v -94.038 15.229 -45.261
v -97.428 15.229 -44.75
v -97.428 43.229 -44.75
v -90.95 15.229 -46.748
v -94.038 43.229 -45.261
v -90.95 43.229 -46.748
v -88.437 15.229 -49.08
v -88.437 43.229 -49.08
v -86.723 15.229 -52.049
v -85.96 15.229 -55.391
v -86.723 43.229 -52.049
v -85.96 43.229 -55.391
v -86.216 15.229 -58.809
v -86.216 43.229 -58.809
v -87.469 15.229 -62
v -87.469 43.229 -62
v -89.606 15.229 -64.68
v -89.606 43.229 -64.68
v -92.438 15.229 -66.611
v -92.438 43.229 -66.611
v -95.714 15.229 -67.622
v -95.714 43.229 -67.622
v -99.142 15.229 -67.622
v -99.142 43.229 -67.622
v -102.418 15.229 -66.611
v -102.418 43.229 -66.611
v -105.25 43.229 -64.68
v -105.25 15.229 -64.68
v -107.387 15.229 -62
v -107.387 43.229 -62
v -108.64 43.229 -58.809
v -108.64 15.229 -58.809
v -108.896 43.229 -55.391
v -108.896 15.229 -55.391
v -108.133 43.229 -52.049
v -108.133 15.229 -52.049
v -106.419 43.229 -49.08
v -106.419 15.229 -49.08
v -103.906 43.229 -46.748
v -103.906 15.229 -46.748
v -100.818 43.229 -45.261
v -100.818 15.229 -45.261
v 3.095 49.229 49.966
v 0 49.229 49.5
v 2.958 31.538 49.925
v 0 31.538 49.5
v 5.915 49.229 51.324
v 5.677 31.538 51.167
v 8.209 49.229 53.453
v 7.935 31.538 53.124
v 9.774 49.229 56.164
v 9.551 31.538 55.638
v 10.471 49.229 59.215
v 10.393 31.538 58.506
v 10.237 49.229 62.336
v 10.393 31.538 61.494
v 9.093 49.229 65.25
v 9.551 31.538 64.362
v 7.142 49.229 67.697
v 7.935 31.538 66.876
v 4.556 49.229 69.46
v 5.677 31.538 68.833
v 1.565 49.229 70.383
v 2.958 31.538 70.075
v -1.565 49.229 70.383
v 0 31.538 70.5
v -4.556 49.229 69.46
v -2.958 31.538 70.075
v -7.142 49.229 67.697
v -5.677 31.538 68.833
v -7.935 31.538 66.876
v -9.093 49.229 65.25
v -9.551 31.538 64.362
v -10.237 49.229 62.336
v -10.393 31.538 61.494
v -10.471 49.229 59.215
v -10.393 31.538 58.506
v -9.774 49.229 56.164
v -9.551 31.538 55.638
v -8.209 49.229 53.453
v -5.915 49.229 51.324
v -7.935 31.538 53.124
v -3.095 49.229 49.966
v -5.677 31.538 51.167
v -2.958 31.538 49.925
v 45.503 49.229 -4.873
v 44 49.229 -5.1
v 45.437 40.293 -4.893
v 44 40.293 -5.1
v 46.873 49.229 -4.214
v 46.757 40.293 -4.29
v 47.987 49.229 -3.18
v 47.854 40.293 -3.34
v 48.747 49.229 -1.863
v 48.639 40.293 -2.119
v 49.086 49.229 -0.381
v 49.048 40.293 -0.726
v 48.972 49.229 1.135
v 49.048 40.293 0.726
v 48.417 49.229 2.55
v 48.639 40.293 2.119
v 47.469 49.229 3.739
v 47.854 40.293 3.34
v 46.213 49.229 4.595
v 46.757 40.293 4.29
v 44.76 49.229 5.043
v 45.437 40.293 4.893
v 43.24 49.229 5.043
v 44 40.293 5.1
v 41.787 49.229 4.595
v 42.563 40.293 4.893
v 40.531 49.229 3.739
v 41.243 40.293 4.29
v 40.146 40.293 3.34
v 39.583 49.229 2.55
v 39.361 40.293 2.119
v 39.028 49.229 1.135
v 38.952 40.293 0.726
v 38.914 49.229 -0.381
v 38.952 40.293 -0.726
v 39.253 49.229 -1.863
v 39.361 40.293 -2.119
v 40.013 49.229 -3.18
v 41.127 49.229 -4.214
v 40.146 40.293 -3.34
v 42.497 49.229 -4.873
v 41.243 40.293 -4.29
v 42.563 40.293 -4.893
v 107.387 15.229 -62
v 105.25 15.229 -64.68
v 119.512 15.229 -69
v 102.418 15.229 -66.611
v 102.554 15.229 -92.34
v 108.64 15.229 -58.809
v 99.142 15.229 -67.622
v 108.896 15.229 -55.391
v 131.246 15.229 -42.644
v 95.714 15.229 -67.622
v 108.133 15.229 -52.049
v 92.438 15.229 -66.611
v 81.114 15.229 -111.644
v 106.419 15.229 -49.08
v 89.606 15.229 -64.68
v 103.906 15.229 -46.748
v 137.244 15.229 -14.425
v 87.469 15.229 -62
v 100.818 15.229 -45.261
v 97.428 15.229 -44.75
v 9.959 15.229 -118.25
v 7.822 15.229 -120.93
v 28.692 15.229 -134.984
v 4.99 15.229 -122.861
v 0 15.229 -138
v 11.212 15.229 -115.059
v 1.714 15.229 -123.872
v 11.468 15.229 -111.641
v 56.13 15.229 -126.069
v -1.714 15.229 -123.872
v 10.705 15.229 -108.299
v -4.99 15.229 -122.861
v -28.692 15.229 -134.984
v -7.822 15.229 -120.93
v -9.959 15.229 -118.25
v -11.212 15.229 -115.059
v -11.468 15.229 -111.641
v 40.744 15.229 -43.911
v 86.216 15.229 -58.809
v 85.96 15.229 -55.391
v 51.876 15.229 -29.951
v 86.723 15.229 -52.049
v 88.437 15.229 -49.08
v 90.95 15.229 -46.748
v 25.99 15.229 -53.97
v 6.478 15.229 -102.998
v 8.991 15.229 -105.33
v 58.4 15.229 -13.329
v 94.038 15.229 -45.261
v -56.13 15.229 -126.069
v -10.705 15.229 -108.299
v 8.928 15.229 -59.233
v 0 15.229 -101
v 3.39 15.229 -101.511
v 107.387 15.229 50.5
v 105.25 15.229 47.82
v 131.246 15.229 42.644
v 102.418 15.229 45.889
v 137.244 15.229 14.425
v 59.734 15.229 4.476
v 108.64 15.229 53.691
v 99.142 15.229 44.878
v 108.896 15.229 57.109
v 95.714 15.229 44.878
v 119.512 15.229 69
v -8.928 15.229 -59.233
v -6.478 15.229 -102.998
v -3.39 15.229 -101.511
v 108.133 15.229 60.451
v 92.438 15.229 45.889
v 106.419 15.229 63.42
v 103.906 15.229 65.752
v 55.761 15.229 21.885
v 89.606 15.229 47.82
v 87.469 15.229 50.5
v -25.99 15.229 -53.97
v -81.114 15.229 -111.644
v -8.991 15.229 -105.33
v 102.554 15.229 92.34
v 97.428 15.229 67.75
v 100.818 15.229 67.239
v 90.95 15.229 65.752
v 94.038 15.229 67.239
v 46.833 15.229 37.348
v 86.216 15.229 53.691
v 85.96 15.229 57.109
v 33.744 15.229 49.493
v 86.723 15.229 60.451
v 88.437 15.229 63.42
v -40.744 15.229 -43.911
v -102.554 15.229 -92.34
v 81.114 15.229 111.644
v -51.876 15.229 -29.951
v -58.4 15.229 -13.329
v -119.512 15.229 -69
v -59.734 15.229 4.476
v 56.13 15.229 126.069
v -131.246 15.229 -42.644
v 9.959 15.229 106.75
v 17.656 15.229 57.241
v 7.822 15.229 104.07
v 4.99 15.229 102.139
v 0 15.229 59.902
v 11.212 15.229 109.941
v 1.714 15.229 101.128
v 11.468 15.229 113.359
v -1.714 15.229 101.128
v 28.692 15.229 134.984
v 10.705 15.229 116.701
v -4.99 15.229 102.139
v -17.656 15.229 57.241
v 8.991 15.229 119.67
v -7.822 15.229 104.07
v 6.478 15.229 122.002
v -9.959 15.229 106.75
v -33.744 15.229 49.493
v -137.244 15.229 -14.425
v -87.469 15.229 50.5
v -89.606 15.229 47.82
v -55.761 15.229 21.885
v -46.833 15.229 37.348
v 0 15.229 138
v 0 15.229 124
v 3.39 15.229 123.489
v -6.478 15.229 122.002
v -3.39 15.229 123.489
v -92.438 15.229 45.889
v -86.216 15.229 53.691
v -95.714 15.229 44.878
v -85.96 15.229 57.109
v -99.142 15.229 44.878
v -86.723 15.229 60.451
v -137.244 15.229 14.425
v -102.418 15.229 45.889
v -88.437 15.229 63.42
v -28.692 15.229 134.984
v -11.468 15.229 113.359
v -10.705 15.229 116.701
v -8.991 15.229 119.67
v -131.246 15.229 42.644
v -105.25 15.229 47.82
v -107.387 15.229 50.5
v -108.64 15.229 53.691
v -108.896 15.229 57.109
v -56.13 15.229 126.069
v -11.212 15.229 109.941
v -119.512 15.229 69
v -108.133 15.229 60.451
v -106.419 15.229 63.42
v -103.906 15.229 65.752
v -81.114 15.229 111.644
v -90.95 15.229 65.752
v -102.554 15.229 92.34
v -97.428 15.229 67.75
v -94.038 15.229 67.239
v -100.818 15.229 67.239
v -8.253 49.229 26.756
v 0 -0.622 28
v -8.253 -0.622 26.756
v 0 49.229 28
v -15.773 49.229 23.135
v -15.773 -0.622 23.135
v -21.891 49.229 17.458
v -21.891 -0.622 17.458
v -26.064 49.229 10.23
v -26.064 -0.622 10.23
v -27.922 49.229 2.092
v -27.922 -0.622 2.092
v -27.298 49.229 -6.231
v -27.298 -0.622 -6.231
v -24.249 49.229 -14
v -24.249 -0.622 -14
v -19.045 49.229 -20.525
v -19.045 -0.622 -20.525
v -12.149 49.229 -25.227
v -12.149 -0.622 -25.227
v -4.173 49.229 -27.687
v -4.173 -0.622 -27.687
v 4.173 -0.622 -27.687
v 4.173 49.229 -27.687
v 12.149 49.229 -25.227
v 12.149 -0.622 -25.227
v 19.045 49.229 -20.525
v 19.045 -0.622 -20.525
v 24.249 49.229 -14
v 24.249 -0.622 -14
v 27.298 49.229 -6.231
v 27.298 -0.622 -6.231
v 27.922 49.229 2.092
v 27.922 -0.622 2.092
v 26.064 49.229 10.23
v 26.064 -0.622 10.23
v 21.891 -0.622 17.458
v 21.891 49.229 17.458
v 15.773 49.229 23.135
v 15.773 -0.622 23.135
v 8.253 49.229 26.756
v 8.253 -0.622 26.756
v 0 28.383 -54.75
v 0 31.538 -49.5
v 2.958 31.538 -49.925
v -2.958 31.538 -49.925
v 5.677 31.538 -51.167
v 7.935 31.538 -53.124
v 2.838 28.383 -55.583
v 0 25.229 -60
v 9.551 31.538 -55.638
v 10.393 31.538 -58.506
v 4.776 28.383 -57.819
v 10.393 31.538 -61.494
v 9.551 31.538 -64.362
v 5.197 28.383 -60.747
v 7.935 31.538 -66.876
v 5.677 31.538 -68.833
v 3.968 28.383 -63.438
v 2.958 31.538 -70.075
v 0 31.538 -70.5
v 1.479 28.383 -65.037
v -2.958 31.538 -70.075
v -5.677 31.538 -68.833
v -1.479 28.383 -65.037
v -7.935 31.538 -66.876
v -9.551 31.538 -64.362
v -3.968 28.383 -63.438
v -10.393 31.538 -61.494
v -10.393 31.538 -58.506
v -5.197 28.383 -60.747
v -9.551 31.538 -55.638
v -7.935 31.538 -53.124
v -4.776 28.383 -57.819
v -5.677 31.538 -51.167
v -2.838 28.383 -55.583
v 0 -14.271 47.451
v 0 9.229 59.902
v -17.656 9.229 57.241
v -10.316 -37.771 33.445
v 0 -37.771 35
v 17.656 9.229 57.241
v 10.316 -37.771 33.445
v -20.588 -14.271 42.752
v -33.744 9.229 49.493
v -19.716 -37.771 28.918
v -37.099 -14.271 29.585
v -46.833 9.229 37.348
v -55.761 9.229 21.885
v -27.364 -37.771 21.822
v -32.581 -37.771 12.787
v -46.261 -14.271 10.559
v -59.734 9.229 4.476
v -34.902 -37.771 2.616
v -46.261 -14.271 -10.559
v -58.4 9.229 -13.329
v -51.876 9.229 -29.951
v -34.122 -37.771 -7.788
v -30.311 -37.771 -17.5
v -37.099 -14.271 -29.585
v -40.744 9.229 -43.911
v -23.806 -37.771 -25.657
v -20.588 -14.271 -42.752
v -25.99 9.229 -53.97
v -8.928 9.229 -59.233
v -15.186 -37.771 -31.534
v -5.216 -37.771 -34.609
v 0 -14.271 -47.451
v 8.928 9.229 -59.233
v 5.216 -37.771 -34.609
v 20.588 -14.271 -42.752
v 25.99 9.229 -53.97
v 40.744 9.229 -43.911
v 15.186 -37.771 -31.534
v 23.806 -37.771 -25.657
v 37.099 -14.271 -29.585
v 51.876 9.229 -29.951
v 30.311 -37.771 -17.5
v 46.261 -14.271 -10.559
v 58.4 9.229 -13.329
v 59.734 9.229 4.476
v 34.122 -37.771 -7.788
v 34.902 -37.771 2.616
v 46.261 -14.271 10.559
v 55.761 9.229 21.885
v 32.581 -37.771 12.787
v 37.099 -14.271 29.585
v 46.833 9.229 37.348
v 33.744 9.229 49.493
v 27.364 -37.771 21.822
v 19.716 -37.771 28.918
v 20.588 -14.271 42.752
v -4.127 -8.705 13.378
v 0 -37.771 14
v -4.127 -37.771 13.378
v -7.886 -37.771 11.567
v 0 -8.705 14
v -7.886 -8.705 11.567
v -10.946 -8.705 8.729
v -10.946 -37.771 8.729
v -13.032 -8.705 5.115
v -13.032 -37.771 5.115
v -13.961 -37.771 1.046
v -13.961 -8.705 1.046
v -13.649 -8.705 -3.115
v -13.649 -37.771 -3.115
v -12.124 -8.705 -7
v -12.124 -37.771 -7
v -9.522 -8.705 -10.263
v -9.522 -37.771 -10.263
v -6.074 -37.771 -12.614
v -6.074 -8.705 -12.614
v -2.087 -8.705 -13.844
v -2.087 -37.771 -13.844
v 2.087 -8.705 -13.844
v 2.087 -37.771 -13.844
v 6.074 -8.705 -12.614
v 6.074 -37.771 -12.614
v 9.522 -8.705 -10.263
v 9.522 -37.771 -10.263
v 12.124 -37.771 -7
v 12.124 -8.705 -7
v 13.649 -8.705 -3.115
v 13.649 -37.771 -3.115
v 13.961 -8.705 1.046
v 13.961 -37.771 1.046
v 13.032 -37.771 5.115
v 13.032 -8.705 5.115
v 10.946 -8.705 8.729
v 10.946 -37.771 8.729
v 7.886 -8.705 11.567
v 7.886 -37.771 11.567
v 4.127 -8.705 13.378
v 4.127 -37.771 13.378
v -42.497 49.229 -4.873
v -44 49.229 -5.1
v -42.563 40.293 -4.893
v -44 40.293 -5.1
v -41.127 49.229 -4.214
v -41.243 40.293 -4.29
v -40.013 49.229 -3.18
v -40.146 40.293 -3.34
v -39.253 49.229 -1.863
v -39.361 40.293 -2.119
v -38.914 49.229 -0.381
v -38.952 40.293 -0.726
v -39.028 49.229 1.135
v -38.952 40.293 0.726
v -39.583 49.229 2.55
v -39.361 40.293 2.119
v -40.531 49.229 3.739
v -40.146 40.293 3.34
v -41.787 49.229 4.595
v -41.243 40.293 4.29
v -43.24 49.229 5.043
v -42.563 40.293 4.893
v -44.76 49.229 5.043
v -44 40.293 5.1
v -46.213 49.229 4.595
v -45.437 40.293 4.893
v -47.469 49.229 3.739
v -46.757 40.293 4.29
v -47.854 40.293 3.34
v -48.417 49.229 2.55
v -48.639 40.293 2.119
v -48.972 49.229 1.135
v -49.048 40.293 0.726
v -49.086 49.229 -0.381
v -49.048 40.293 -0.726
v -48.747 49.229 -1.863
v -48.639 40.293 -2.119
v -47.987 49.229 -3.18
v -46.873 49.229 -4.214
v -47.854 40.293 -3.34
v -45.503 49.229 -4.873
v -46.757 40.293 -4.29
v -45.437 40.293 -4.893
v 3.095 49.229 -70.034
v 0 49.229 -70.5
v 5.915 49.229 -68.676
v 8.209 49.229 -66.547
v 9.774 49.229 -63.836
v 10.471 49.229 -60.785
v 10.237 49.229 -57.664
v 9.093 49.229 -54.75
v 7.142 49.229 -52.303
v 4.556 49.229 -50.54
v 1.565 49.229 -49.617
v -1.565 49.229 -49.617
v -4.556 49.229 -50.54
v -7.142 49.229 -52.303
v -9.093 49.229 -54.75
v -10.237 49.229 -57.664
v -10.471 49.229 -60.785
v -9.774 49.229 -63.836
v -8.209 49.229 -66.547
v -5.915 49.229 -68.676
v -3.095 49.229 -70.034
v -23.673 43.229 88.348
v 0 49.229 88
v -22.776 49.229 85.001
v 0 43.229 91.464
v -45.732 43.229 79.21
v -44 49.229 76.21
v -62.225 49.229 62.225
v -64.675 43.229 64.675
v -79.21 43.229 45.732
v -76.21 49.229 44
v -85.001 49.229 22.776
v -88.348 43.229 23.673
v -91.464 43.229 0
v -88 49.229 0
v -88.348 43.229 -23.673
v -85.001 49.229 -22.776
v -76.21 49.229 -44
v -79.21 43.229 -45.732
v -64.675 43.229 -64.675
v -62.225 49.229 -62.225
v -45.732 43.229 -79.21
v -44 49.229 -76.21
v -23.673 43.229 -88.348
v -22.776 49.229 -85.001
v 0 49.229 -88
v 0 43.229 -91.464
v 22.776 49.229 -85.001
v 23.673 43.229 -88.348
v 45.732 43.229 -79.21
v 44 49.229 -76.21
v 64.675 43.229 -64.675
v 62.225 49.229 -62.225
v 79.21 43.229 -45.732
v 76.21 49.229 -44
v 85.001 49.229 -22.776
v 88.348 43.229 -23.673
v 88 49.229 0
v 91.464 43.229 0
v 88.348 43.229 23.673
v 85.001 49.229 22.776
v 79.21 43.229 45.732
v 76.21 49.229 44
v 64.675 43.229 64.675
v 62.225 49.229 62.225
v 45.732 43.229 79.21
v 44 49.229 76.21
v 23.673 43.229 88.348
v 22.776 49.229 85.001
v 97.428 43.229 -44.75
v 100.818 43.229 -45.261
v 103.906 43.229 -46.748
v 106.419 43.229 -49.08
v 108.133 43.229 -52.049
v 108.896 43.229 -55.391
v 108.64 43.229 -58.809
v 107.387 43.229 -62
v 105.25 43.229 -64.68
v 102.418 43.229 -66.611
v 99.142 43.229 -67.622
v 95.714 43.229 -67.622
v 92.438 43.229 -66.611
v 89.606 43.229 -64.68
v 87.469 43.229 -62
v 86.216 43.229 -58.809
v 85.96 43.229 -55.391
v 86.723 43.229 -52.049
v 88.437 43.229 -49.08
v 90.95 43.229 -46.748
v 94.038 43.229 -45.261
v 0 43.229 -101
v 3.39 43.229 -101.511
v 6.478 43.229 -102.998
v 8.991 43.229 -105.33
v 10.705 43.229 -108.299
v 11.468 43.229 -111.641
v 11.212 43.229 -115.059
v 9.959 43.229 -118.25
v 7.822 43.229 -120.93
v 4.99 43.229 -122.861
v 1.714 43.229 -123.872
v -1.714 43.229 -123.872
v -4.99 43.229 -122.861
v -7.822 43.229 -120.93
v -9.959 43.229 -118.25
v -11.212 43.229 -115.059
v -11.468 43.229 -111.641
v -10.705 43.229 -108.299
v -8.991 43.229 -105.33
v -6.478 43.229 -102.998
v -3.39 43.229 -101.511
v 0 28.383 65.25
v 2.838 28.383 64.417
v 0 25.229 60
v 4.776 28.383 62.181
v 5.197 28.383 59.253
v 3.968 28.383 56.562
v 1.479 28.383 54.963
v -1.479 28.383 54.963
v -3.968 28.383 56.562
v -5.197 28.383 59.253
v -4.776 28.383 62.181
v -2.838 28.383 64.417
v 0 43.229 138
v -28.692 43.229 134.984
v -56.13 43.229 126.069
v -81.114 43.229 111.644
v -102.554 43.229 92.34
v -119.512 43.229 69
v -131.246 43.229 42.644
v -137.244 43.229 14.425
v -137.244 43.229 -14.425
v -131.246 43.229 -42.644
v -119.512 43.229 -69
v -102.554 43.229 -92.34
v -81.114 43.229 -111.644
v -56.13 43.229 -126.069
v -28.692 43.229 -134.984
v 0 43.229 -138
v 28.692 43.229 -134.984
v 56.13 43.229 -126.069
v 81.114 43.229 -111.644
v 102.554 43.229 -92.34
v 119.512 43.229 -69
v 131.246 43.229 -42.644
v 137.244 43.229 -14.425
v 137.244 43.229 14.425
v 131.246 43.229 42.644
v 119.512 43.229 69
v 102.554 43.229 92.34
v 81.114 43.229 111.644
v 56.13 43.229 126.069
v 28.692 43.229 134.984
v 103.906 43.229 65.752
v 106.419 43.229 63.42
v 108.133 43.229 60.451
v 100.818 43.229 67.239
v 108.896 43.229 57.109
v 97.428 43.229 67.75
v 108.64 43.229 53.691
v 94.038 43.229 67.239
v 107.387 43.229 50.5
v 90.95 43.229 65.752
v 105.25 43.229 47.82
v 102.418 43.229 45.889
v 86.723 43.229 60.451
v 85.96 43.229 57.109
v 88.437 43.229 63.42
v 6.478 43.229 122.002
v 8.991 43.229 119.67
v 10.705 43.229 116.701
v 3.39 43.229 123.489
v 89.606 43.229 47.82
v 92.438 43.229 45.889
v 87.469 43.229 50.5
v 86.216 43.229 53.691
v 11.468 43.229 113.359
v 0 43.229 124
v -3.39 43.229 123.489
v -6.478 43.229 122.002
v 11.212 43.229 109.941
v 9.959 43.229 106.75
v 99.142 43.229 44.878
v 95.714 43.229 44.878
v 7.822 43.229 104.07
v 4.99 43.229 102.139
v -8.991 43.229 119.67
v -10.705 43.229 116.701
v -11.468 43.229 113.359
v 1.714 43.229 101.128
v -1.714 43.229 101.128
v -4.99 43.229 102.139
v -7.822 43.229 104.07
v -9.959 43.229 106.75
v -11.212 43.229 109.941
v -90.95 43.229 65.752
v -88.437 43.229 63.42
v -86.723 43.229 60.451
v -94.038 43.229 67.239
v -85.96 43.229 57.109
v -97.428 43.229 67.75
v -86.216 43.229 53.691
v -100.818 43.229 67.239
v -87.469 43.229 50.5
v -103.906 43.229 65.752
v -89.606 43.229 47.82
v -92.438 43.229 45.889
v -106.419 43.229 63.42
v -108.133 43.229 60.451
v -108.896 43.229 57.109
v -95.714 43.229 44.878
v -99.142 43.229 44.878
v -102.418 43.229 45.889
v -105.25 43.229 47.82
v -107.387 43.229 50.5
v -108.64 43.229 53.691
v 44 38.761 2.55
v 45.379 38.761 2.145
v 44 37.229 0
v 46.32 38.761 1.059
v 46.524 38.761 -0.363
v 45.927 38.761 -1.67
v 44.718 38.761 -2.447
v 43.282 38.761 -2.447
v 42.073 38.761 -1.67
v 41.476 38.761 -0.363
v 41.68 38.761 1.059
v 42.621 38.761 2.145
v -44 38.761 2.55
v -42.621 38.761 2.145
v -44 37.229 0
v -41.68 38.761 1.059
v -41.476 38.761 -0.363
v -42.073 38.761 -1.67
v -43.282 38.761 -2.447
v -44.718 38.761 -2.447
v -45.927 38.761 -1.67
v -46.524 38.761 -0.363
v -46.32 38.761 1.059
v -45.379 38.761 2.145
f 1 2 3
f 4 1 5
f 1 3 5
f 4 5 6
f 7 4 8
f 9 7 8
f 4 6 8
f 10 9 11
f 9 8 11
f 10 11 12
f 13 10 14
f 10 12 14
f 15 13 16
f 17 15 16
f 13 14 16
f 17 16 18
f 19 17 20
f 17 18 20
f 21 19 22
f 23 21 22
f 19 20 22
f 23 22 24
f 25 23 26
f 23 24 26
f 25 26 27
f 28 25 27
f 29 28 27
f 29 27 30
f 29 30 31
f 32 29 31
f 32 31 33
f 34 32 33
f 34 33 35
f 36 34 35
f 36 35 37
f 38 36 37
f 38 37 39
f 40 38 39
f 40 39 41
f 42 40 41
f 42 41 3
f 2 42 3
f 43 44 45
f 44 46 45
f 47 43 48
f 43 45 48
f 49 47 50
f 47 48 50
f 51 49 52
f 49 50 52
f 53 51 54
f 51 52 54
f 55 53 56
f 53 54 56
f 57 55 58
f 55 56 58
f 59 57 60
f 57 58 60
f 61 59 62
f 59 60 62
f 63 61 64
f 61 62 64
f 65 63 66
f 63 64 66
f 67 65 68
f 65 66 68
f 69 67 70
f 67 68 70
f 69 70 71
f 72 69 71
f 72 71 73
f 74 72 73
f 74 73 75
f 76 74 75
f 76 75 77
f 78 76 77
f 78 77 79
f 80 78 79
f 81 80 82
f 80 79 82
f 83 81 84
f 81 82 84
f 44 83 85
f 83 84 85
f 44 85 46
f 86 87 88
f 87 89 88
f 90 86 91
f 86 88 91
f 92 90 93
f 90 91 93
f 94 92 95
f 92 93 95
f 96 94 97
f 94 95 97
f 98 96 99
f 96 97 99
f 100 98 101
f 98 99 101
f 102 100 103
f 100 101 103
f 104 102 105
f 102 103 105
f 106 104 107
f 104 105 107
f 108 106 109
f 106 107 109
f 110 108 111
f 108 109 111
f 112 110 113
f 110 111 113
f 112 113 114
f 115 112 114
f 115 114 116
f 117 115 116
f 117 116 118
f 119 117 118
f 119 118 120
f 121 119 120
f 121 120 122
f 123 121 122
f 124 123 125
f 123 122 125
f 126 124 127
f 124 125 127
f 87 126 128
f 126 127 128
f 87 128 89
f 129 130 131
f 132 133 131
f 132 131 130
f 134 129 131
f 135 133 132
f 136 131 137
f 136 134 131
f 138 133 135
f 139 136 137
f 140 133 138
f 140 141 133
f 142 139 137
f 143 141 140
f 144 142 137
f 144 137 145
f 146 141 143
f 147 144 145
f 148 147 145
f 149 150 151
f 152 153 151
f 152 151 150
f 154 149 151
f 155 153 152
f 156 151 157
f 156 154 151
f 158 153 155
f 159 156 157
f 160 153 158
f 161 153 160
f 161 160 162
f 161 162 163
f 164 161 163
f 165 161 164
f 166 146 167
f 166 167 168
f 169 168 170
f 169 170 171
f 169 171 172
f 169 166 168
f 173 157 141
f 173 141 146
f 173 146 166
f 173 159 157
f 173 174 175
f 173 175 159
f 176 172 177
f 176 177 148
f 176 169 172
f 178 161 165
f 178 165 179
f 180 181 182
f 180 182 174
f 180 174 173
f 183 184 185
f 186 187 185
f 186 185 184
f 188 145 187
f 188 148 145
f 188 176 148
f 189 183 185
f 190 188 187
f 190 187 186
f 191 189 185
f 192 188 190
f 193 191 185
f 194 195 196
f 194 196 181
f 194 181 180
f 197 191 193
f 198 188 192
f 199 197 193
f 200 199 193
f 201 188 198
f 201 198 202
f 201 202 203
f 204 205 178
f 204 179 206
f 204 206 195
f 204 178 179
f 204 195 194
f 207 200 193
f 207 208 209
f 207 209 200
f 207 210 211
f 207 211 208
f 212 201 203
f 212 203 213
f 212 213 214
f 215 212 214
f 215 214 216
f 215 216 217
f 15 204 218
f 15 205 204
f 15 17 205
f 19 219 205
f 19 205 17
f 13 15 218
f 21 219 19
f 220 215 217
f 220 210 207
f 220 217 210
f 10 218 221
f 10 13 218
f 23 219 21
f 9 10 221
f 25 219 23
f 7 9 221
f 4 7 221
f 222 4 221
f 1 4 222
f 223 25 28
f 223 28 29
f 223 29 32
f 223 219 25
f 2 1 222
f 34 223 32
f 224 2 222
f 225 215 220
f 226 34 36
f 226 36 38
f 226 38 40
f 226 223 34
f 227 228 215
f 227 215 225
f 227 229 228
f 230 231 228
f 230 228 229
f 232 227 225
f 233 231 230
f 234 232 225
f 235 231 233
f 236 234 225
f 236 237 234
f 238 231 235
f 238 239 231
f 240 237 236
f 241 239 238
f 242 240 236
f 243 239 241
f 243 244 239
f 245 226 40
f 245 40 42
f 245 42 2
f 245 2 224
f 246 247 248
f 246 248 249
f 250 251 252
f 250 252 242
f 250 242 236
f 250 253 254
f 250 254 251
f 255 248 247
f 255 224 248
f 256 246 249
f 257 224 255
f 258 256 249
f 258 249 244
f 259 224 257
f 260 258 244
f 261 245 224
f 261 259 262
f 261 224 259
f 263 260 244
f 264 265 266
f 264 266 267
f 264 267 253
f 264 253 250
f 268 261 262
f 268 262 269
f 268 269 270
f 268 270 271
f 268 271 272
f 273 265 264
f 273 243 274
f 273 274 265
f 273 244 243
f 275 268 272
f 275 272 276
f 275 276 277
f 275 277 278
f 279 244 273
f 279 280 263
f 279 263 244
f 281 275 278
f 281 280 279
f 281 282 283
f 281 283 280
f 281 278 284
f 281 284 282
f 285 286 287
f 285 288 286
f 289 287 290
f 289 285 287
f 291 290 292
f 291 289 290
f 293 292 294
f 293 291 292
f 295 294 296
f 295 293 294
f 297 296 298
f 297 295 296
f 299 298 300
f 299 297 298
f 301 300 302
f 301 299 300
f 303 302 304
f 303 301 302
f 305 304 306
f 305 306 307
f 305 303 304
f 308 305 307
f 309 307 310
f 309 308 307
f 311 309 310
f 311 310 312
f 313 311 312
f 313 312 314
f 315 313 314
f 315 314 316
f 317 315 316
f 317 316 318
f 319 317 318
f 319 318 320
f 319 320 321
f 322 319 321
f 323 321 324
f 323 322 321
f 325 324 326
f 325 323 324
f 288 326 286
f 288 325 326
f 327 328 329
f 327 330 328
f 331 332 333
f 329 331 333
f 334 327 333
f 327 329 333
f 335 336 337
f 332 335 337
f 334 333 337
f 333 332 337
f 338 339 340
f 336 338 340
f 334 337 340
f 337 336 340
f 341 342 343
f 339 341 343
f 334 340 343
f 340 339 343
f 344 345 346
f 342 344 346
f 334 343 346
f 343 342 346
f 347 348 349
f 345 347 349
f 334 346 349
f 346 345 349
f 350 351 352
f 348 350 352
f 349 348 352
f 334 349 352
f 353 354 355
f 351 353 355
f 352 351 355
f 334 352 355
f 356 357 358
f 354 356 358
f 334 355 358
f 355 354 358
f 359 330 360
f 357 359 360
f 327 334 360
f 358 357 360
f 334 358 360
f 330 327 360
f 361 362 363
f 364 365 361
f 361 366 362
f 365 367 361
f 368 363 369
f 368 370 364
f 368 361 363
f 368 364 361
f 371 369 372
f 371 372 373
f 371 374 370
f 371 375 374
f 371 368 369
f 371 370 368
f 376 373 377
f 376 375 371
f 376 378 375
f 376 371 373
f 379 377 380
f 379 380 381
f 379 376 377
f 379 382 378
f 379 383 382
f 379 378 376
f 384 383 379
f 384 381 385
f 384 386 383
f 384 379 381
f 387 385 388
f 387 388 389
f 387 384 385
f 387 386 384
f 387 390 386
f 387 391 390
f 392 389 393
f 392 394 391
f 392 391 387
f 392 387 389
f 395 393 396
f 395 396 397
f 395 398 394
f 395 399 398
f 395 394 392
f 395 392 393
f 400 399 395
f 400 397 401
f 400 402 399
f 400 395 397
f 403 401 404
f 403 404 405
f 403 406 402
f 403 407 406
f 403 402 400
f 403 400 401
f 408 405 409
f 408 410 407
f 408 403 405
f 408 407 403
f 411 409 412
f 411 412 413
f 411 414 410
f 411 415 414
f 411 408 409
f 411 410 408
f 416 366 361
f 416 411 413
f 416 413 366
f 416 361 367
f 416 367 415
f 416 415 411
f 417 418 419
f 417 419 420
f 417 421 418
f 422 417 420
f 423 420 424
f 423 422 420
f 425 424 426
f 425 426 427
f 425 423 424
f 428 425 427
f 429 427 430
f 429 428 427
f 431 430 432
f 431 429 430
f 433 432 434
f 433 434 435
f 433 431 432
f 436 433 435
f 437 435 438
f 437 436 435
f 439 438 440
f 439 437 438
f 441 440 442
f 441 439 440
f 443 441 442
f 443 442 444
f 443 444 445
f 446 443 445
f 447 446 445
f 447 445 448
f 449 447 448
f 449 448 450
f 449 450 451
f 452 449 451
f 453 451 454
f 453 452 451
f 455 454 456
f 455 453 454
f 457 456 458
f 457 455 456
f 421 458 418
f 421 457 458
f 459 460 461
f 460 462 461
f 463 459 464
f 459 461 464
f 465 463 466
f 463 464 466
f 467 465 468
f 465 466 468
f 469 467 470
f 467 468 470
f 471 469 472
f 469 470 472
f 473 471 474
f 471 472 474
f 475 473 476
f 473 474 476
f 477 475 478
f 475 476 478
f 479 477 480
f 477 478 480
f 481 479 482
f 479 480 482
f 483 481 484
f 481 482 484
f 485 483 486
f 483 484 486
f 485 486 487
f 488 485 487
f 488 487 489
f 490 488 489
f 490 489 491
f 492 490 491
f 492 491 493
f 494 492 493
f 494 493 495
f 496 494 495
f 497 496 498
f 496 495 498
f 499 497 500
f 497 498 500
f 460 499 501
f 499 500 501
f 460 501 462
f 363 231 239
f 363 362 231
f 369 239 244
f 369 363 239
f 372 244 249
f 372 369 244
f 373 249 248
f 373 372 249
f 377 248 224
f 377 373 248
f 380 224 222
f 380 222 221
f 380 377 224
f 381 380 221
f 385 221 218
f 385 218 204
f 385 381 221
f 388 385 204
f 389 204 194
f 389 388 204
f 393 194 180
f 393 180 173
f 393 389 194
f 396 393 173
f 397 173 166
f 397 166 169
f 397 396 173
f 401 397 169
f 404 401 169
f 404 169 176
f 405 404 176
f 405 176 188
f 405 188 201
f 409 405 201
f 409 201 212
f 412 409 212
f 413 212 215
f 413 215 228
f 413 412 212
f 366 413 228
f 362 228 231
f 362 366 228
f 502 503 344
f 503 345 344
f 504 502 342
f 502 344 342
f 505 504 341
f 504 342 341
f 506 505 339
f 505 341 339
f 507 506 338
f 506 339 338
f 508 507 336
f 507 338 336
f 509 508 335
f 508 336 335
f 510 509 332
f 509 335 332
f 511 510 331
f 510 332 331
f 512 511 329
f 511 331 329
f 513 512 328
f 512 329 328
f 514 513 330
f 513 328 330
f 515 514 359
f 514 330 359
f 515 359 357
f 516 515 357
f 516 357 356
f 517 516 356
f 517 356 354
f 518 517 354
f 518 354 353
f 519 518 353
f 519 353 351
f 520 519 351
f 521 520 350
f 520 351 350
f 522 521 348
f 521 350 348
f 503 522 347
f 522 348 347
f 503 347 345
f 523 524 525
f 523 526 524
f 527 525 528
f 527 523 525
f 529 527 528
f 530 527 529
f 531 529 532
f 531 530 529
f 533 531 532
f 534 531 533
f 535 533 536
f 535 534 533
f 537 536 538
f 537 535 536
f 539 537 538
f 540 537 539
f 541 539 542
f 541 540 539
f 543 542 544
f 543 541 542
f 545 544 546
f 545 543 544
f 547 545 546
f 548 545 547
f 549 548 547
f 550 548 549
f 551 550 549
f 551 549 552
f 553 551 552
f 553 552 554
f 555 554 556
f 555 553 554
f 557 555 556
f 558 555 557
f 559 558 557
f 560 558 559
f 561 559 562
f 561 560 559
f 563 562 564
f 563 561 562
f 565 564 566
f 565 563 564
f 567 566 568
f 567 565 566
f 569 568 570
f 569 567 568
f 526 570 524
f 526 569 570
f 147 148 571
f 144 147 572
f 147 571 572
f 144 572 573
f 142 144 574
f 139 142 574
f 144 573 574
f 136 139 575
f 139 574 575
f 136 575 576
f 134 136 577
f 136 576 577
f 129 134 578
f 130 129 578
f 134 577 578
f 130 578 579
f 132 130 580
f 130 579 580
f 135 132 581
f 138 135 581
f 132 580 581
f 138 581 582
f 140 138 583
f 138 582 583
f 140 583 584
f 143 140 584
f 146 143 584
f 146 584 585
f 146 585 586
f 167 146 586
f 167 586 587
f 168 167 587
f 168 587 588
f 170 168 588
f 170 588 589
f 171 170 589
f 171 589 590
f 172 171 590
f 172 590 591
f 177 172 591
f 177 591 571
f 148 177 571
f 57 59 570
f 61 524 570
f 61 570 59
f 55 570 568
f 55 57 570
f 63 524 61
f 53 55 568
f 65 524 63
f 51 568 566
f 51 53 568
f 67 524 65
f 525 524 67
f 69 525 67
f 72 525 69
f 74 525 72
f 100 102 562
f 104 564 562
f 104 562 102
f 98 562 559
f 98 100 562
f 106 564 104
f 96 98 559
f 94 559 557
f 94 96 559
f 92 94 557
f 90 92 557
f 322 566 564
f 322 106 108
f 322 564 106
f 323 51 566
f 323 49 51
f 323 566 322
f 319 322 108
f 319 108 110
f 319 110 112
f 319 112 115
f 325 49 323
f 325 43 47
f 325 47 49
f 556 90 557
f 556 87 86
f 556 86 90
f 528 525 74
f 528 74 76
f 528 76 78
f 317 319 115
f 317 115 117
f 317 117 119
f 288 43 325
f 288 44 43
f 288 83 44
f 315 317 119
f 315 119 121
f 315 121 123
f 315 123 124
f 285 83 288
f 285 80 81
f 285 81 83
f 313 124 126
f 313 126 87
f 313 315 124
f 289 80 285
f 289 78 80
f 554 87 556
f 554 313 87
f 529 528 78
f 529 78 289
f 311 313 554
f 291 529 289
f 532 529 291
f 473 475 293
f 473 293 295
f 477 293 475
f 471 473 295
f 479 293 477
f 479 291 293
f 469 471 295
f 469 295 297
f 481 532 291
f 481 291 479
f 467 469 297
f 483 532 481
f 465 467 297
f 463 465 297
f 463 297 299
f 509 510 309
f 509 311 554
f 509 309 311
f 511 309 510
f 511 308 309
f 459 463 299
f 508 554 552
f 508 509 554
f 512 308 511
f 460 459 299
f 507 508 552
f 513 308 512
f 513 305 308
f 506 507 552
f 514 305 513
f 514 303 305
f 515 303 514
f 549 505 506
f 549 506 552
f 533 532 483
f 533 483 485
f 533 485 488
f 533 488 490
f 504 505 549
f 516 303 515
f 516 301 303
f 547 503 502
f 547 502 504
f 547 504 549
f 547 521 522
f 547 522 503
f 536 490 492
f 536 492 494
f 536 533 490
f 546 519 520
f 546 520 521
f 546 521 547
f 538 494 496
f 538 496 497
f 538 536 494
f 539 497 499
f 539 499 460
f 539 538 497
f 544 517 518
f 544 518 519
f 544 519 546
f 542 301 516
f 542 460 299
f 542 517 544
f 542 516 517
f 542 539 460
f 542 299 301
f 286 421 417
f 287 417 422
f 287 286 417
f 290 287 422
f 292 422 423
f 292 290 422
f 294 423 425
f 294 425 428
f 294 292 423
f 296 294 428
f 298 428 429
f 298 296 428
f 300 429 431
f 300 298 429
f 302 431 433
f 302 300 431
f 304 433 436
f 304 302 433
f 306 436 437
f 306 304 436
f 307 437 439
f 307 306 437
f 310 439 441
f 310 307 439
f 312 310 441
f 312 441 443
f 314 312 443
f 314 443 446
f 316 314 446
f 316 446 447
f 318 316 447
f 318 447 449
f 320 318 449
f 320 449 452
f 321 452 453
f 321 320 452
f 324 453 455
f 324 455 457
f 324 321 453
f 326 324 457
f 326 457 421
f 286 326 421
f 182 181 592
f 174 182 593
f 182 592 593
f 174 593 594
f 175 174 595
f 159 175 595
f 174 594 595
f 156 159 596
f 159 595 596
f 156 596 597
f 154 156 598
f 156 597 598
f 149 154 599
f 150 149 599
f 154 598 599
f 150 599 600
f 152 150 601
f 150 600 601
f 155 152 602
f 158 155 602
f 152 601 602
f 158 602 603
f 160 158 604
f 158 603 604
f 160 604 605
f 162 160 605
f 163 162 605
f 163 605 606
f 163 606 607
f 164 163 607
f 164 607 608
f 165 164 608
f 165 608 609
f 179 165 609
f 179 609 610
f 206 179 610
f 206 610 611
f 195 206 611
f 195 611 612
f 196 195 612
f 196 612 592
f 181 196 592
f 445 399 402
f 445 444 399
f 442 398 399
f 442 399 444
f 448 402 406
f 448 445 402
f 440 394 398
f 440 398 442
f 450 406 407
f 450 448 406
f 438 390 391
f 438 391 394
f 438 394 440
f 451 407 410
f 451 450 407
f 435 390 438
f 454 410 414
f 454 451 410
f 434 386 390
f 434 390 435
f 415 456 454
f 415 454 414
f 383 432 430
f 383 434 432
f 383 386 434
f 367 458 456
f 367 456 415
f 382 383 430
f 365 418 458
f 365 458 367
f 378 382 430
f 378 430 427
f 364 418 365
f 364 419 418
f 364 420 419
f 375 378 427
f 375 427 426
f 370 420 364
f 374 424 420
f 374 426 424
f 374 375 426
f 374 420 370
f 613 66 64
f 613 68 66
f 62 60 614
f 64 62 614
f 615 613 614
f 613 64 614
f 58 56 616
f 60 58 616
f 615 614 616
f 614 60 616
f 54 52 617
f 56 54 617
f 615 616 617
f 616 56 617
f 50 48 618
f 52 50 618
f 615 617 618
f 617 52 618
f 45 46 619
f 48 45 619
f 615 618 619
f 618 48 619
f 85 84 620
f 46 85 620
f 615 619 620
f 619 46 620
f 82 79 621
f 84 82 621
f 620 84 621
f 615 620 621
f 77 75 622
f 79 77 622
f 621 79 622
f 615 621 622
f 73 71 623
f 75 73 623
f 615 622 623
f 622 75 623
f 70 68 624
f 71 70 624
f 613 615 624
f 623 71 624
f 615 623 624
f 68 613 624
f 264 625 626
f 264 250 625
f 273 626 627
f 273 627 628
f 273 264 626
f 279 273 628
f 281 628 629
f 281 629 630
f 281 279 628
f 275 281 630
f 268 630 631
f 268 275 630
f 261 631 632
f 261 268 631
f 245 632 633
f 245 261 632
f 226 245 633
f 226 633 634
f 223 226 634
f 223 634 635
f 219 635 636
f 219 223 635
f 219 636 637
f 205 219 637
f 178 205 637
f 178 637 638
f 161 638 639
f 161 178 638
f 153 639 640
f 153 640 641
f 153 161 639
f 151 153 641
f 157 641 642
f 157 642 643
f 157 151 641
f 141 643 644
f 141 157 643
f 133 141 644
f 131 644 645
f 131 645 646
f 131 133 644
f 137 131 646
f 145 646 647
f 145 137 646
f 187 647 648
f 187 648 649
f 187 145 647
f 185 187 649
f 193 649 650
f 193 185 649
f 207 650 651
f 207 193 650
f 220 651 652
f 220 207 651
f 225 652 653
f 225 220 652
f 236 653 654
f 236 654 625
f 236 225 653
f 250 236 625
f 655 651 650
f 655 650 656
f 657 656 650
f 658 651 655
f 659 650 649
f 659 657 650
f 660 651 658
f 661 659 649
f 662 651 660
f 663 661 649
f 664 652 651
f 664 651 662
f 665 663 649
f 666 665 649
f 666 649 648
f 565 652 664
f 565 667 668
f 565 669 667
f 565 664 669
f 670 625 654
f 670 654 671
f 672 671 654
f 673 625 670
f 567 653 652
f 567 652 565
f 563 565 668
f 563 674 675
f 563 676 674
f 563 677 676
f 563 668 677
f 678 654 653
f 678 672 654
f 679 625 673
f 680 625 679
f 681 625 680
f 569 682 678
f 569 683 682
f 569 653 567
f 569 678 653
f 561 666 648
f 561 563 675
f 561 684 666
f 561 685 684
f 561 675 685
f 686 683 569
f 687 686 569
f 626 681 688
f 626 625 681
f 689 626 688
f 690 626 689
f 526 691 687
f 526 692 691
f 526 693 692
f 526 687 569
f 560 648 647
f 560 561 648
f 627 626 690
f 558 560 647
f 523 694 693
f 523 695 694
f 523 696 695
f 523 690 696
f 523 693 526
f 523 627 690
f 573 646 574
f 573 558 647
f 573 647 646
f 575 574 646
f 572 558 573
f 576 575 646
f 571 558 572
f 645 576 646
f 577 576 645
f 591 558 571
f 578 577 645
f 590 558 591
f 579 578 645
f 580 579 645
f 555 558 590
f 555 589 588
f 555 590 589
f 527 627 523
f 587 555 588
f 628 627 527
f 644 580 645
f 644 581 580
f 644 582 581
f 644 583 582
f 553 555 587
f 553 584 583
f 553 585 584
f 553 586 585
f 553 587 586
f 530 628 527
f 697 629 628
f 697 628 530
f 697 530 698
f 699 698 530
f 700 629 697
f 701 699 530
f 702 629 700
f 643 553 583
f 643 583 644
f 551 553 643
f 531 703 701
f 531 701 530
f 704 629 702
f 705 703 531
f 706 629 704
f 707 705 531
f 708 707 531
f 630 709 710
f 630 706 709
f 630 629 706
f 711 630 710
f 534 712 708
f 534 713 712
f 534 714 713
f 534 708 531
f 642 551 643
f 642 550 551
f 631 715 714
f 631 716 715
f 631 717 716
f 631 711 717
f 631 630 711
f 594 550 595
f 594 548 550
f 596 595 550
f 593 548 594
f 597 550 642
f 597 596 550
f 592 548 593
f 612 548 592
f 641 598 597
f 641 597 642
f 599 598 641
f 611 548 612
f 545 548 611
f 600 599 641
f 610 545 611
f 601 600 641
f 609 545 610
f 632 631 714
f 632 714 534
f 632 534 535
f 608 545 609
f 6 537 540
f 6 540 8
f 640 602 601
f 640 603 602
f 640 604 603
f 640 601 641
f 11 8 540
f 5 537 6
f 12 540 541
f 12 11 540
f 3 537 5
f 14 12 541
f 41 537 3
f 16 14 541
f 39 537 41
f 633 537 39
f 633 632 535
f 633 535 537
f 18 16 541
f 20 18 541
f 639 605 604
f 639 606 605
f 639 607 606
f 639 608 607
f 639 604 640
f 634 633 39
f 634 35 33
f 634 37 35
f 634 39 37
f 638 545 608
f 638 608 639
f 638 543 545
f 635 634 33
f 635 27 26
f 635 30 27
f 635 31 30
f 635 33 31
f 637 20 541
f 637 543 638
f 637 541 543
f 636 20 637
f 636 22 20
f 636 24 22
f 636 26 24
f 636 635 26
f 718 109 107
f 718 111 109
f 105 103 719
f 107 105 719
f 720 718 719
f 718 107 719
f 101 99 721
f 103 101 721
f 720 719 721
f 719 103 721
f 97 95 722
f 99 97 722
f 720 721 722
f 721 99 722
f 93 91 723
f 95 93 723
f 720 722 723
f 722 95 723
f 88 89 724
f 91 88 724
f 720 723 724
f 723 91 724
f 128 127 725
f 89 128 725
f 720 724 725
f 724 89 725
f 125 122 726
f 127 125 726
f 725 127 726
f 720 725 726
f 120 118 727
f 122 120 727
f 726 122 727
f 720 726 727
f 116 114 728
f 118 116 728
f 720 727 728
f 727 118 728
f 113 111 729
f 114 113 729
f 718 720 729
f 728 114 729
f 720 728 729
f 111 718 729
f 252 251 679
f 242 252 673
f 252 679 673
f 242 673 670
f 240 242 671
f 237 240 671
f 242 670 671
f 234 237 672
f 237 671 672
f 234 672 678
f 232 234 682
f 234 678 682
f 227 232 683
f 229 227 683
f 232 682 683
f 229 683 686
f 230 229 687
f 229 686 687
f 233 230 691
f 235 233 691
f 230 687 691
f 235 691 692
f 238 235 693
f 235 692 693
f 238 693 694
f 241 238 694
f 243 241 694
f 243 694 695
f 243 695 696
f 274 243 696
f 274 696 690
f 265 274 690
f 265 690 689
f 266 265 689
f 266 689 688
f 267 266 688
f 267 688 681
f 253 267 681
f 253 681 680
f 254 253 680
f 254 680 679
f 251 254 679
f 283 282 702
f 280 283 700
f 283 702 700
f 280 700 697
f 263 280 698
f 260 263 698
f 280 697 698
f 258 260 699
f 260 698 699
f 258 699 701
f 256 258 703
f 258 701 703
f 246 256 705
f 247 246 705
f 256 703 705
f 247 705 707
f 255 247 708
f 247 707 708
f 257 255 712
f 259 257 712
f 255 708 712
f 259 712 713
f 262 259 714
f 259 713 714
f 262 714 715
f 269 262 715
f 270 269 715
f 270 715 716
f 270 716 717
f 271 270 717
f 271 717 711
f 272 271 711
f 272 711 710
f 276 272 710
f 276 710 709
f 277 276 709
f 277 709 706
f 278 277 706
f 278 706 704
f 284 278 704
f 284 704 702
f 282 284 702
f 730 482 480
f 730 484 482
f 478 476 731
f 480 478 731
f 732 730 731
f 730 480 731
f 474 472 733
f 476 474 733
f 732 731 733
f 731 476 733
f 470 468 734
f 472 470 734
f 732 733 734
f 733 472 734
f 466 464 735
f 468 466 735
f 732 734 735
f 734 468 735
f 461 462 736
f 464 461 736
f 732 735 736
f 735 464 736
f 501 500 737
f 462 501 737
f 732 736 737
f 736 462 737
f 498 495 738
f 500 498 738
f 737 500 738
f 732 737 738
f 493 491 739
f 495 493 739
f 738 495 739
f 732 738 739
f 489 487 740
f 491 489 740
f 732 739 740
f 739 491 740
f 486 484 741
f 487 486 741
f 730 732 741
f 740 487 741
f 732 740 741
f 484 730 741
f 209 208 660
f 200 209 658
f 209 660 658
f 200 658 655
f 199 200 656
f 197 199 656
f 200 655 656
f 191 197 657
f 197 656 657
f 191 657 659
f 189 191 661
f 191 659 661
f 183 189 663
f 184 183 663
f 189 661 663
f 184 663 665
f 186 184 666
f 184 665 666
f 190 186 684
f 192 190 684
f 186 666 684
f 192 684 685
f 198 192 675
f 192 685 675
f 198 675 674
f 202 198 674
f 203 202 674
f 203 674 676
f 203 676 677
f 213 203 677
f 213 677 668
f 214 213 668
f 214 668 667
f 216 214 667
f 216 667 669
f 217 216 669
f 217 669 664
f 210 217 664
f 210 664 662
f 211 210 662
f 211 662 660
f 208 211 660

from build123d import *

# Parameters (mm, degrees)
CUT_EXTRUDE1_REACH     = 213.303
SKETCH2_R              = 11.5
M24_TAPPED_HOLE1_D     = 21
M24_TAPPED_HOLE1_DEPTH = 17.6909635
M24_TAPPED_HOLE1_TIP   = 6.3090365
M12_TAPPED_HOLE1_D     = 10.2
M12_TAPPED_HOLE1_DEPTH = 8.935610843
M12_TAPPED_HOLE1_TIP   = 3.064389157


with BuildPart() as part:
    # Sketch1 → Revolve1 (revolve)
    with BuildSketch(Plane.XY, mode=Mode.PRIVATE) as revolve1_sk:
        Polygon((14, -37.771370899), (14, -8.704913174), (28, -0.622009405), (28, 49.228629101), (88, 49.228629101), (91.464101615, 43.228629101), (138, 43.228629101), (138, 15.228629101), (59.901806028, 15.228629101), (59.901806028, 9.228629101), (35, -37.771370899), align=None)
    revolve(revolve1_sk.sketch.rotate(Axis((0, 62.992349216, 0), (0, -1, 0)), 90), axis=Axis((0, 62.992349216, 0), (0, -1, 0)))

    # Sketch2 → Cut-Extrude1 (cut, up to next)
    with BuildSketch(Plane(origin=(0, 43.228629101, 0), x_dir=(1, 0, 0), z_dir=(0, 1, 0)), mode=Mode.PRIVATE) as cut_extrude1_sk1:
        with Locations(Location((0, 112.5, 0), (0, 0, 270))):
            Circle(SKETCH2_R)
    cut_extrude1_tool1 = extrude(cut_extrude1_sk1.sketch, amount=-CUT_EXTRUDE1_REACH, mode=Mode.PRIVATE) & part.part
    # Sketch2 → Cut-Extrude1 (cut, up to next)
    with BuildSketch(Plane(origin=(0, 43.228629101, 0), x_dir=(1, 0, 0), z_dir=(0, 1, 0)), mode=Mode.PRIVATE) as cut_extrude1_sk2:
        with Locations(Location((97.427857926, 56.25, 0), (0, 0, 270))):
            Circle(SKETCH2_R)
    cut_extrude1_tool2 = extrude(cut_extrude1_sk2.sketch, amount=-CUT_EXTRUDE1_REACH, mode=Mode.PRIVATE) & part.part
    # Sketch2 → Cut-Extrude1 (cut, up to next)
    with BuildSketch(Plane(origin=(0, 43.228629101, 0), x_dir=(1, 0, 0), z_dir=(0, 1, 0)), mode=Mode.PRIVATE) as cut_extrude1_sk3:
        with Locations(Location((97.427857926, -56.25, 0), (0, 0, 270))):
            Circle(SKETCH2_R)
    cut_extrude1_tool3 = extrude(cut_extrude1_sk3.sketch, amount=-CUT_EXTRUDE1_REACH, mode=Mode.PRIVATE) & part.part
    # Sketch2 → Cut-Extrude1 (cut, up to next)
    with BuildSketch(Plane(origin=(0, 43.228629101, 0), x_dir=(1, 0, 0), z_dir=(0, 1, 0)), mode=Mode.PRIVATE) as cut_extrude1_sk4:
        with Locations(Location((0, -112.5, 0), (0, 0, 270))):
            Circle(SKETCH2_R)
    cut_extrude1_tool4 = extrude(cut_extrude1_sk4.sketch, amount=-CUT_EXTRUDE1_REACH, mode=Mode.PRIVATE) & part.part
    # Sketch2 → Cut-Extrude1 (cut, up to next)
    with BuildSketch(Plane(origin=(0, 43.228629101, 0), x_dir=(1, 0, 0), z_dir=(0, 1, 0)), mode=Mode.PRIVATE) as cut_extrude1_sk5:
        with Locations(Location((-97.427857926, -56.25, 0), (0, 0, 270))):
            Circle(SKETCH2_R)
    cut_extrude1_tool5 = extrude(cut_extrude1_sk5.sketch, amount=-CUT_EXTRUDE1_REACH, mode=Mode.PRIVATE) & part.part
    # Sketch2 → Cut-Extrude1 (cut, up to next)
    with BuildSketch(Plane(origin=(0, 43.228629101, 0), x_dir=(1, 0, 0), z_dir=(0, 1, 0)), mode=Mode.PRIVATE) as cut_extrude1_sk6:
        with Locations(Location((-97.427857926, 56.25, 0), (0, 0, 270))):
            Circle(SKETCH2_R)
    cut_extrude1_tool6 = extrude(cut_extrude1_sk6.sketch, amount=-CUT_EXTRUDE1_REACH, mode=Mode.PRIVATE) & part.part
    add(cut_extrude1_tool1.solids().sort_by_distance((0, 43.228629, -112.5))[0], mode=Mode.SUBTRACT)
    add(cut_extrude1_tool2.solids().sort_by_distance((97.427858, 43.228629, -56.25))[0], mode=Mode.SUBTRACT)
    add(cut_extrude1_tool3.solids().sort_by_distance((97.427858, 43.228629, 56.25))[0], mode=Mode.SUBTRACT)
    add(cut_extrude1_tool4.solids().sort_by_distance((0, 43.228629, 112.5))[0], mode=Mode.SUBTRACT)
    add(cut_extrude1_tool5.solids().sort_by_distance((-97.427858, 43.228629, 56.25))[0], mode=Mode.SUBTRACT)
    add(cut_extrude1_tool6.solids().sort_by_distance((-97.427858, 43.228629, -56.25))[0], mode=Mode.SUBTRACT)

    # M24 Tapped Hole1
    with Locations(Plane(origin=(0, 49.228629101, -60), x_dir=(0, 0, 1), z_dir=(0, 1, 0))):
        with Locations((0, 0), (120, 0)):
            Hole(M24_TAPPED_HOLE1_D / 2, depth=M24_TAPPED_HOLE1_DEPTH)
            with Locations((0, 0, -(M24_TAPPED_HOLE1_DEPTH + M24_TAPPED_HOLE1_TIP / 2))):  # 118° drill point
                Cone(0, M24_TAPPED_HOLE1_D / 2, M24_TAPPED_HOLE1_TIP, mode=Mode.SUBTRACT)

    # M12 Tapped Hole1
    with Locations(Plane(origin=(-44, 49.228629101, 0), x_dir=(0, 0, 1), z_dir=(0, 1, 0))):
        with Locations((0, 0), (0, 88)):
            Hole(M12_TAPPED_HOLE1_D / 2, depth=M12_TAPPED_HOLE1_DEPTH)
            with Locations((0, 0, -(M12_TAPPED_HOLE1_DEPTH + M12_TAPPED_HOLE1_TIP / 2))):  # 118° drill point
                Cone(0, M12_TAPPED_HOLE1_D / 2, M12_TAPPED_HOLE1_TIP, mode=Mode.SUBTRACT)


solid = part.part
